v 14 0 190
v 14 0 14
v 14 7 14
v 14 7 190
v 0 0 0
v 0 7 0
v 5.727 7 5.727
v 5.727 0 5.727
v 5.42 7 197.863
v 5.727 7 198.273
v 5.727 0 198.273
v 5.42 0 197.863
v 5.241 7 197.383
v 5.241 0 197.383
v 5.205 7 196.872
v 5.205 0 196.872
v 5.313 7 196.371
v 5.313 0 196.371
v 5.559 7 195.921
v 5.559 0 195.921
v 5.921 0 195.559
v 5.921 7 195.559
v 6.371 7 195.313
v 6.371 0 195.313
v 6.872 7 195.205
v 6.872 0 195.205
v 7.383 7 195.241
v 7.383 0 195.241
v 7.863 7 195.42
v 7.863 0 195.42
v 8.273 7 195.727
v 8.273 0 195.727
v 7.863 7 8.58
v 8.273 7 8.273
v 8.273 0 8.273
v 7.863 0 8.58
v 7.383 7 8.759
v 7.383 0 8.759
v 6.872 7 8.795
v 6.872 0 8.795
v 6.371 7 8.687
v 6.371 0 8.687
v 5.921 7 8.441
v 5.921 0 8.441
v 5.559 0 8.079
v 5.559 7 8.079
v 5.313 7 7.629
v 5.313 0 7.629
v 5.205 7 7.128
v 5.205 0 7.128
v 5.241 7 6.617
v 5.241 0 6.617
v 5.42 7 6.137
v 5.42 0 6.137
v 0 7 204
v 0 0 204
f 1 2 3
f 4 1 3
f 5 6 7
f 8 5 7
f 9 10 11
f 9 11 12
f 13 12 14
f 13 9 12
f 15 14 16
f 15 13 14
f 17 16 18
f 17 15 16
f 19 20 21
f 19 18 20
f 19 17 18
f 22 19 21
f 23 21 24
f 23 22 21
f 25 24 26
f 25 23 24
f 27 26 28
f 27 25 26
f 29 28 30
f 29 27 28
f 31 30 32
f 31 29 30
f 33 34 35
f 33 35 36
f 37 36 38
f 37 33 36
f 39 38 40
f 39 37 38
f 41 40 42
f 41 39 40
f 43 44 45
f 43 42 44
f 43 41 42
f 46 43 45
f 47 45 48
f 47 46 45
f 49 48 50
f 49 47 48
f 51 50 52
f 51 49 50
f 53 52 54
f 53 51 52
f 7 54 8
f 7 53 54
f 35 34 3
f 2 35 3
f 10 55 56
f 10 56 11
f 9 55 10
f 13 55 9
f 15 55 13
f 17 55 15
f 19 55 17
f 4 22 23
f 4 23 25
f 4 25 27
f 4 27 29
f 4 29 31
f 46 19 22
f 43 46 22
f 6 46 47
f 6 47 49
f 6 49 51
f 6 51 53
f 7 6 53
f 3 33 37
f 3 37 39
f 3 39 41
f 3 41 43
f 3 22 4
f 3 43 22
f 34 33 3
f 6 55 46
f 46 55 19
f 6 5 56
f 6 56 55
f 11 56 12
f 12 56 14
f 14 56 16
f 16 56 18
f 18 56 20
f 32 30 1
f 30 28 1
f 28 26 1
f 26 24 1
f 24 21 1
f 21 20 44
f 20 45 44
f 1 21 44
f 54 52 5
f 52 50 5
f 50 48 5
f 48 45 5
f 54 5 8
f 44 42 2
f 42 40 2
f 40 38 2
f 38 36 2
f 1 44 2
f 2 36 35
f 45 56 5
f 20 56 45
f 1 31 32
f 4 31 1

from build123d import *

# Parameters (mm, degrees)
SKETCH1_W           = 14
SKETCH1_H           = 7
BOSS_EXTRUDE1_DEPTH = 204
CUT_EXTRUDE1_DEPTH  = 8
CUT_EXTRUDE2_DEPTH  = 8


with BuildPart() as part:
    # Sketch1 → Boss-Extrude1 (new body)
    with BuildSketch(Plane.XY):
        with Locations((7, 3.5)):
            Rectangle(SKETCH1_W, SKETCH1_H)
    extrude(amount=BOSS_EXTRUDE1_DEPTH)

    # Sketch2 → Cut-Extrude1 (cut, through all)
    with BuildSketch(Plane(origin=(0, 7, 0), x_dir=(1, 0, 0), z_dir=(0, 1, 0))):
        Polygon((0, 0), (14, -14), (14, 0), align=None)
        Polygon((14, -204), (0, -204), (14, -190), align=None)
    extrude(amount=-CUT_EXTRUDE1_DEPTH, mode=Mode.SUBTRACT)

    # Sketch3 → Cut-Extrude2 (cut, through all)
    with BuildSketch(Plane(origin=(0, 7, 0), x_dir=(1, 0, 0), z_dir=(0, 1, 0))):
        with BuildLine():
            Line((8.272792206, -195.727207794), (5.727207794, -198.272792206))
            ThreePointArc((5.727207794, -198.272792206), (5.727207794, -195.727207794), (8.272792206, -195.727207794))
        make_face()
        with BuildLine():
            Line((5.727207794, -5.727207794), (8.272792206, -8.272792206))
            ThreePointArc((8.272792206, -8.272792206), (5.727207794, -8.272792206), (5.727207794, -5.727207794))
        make_face()
    extrude(amount=-CUT_EXTRUDE2_DEPTH, mode=Mode.SUBTRACT)


solid = part.part
